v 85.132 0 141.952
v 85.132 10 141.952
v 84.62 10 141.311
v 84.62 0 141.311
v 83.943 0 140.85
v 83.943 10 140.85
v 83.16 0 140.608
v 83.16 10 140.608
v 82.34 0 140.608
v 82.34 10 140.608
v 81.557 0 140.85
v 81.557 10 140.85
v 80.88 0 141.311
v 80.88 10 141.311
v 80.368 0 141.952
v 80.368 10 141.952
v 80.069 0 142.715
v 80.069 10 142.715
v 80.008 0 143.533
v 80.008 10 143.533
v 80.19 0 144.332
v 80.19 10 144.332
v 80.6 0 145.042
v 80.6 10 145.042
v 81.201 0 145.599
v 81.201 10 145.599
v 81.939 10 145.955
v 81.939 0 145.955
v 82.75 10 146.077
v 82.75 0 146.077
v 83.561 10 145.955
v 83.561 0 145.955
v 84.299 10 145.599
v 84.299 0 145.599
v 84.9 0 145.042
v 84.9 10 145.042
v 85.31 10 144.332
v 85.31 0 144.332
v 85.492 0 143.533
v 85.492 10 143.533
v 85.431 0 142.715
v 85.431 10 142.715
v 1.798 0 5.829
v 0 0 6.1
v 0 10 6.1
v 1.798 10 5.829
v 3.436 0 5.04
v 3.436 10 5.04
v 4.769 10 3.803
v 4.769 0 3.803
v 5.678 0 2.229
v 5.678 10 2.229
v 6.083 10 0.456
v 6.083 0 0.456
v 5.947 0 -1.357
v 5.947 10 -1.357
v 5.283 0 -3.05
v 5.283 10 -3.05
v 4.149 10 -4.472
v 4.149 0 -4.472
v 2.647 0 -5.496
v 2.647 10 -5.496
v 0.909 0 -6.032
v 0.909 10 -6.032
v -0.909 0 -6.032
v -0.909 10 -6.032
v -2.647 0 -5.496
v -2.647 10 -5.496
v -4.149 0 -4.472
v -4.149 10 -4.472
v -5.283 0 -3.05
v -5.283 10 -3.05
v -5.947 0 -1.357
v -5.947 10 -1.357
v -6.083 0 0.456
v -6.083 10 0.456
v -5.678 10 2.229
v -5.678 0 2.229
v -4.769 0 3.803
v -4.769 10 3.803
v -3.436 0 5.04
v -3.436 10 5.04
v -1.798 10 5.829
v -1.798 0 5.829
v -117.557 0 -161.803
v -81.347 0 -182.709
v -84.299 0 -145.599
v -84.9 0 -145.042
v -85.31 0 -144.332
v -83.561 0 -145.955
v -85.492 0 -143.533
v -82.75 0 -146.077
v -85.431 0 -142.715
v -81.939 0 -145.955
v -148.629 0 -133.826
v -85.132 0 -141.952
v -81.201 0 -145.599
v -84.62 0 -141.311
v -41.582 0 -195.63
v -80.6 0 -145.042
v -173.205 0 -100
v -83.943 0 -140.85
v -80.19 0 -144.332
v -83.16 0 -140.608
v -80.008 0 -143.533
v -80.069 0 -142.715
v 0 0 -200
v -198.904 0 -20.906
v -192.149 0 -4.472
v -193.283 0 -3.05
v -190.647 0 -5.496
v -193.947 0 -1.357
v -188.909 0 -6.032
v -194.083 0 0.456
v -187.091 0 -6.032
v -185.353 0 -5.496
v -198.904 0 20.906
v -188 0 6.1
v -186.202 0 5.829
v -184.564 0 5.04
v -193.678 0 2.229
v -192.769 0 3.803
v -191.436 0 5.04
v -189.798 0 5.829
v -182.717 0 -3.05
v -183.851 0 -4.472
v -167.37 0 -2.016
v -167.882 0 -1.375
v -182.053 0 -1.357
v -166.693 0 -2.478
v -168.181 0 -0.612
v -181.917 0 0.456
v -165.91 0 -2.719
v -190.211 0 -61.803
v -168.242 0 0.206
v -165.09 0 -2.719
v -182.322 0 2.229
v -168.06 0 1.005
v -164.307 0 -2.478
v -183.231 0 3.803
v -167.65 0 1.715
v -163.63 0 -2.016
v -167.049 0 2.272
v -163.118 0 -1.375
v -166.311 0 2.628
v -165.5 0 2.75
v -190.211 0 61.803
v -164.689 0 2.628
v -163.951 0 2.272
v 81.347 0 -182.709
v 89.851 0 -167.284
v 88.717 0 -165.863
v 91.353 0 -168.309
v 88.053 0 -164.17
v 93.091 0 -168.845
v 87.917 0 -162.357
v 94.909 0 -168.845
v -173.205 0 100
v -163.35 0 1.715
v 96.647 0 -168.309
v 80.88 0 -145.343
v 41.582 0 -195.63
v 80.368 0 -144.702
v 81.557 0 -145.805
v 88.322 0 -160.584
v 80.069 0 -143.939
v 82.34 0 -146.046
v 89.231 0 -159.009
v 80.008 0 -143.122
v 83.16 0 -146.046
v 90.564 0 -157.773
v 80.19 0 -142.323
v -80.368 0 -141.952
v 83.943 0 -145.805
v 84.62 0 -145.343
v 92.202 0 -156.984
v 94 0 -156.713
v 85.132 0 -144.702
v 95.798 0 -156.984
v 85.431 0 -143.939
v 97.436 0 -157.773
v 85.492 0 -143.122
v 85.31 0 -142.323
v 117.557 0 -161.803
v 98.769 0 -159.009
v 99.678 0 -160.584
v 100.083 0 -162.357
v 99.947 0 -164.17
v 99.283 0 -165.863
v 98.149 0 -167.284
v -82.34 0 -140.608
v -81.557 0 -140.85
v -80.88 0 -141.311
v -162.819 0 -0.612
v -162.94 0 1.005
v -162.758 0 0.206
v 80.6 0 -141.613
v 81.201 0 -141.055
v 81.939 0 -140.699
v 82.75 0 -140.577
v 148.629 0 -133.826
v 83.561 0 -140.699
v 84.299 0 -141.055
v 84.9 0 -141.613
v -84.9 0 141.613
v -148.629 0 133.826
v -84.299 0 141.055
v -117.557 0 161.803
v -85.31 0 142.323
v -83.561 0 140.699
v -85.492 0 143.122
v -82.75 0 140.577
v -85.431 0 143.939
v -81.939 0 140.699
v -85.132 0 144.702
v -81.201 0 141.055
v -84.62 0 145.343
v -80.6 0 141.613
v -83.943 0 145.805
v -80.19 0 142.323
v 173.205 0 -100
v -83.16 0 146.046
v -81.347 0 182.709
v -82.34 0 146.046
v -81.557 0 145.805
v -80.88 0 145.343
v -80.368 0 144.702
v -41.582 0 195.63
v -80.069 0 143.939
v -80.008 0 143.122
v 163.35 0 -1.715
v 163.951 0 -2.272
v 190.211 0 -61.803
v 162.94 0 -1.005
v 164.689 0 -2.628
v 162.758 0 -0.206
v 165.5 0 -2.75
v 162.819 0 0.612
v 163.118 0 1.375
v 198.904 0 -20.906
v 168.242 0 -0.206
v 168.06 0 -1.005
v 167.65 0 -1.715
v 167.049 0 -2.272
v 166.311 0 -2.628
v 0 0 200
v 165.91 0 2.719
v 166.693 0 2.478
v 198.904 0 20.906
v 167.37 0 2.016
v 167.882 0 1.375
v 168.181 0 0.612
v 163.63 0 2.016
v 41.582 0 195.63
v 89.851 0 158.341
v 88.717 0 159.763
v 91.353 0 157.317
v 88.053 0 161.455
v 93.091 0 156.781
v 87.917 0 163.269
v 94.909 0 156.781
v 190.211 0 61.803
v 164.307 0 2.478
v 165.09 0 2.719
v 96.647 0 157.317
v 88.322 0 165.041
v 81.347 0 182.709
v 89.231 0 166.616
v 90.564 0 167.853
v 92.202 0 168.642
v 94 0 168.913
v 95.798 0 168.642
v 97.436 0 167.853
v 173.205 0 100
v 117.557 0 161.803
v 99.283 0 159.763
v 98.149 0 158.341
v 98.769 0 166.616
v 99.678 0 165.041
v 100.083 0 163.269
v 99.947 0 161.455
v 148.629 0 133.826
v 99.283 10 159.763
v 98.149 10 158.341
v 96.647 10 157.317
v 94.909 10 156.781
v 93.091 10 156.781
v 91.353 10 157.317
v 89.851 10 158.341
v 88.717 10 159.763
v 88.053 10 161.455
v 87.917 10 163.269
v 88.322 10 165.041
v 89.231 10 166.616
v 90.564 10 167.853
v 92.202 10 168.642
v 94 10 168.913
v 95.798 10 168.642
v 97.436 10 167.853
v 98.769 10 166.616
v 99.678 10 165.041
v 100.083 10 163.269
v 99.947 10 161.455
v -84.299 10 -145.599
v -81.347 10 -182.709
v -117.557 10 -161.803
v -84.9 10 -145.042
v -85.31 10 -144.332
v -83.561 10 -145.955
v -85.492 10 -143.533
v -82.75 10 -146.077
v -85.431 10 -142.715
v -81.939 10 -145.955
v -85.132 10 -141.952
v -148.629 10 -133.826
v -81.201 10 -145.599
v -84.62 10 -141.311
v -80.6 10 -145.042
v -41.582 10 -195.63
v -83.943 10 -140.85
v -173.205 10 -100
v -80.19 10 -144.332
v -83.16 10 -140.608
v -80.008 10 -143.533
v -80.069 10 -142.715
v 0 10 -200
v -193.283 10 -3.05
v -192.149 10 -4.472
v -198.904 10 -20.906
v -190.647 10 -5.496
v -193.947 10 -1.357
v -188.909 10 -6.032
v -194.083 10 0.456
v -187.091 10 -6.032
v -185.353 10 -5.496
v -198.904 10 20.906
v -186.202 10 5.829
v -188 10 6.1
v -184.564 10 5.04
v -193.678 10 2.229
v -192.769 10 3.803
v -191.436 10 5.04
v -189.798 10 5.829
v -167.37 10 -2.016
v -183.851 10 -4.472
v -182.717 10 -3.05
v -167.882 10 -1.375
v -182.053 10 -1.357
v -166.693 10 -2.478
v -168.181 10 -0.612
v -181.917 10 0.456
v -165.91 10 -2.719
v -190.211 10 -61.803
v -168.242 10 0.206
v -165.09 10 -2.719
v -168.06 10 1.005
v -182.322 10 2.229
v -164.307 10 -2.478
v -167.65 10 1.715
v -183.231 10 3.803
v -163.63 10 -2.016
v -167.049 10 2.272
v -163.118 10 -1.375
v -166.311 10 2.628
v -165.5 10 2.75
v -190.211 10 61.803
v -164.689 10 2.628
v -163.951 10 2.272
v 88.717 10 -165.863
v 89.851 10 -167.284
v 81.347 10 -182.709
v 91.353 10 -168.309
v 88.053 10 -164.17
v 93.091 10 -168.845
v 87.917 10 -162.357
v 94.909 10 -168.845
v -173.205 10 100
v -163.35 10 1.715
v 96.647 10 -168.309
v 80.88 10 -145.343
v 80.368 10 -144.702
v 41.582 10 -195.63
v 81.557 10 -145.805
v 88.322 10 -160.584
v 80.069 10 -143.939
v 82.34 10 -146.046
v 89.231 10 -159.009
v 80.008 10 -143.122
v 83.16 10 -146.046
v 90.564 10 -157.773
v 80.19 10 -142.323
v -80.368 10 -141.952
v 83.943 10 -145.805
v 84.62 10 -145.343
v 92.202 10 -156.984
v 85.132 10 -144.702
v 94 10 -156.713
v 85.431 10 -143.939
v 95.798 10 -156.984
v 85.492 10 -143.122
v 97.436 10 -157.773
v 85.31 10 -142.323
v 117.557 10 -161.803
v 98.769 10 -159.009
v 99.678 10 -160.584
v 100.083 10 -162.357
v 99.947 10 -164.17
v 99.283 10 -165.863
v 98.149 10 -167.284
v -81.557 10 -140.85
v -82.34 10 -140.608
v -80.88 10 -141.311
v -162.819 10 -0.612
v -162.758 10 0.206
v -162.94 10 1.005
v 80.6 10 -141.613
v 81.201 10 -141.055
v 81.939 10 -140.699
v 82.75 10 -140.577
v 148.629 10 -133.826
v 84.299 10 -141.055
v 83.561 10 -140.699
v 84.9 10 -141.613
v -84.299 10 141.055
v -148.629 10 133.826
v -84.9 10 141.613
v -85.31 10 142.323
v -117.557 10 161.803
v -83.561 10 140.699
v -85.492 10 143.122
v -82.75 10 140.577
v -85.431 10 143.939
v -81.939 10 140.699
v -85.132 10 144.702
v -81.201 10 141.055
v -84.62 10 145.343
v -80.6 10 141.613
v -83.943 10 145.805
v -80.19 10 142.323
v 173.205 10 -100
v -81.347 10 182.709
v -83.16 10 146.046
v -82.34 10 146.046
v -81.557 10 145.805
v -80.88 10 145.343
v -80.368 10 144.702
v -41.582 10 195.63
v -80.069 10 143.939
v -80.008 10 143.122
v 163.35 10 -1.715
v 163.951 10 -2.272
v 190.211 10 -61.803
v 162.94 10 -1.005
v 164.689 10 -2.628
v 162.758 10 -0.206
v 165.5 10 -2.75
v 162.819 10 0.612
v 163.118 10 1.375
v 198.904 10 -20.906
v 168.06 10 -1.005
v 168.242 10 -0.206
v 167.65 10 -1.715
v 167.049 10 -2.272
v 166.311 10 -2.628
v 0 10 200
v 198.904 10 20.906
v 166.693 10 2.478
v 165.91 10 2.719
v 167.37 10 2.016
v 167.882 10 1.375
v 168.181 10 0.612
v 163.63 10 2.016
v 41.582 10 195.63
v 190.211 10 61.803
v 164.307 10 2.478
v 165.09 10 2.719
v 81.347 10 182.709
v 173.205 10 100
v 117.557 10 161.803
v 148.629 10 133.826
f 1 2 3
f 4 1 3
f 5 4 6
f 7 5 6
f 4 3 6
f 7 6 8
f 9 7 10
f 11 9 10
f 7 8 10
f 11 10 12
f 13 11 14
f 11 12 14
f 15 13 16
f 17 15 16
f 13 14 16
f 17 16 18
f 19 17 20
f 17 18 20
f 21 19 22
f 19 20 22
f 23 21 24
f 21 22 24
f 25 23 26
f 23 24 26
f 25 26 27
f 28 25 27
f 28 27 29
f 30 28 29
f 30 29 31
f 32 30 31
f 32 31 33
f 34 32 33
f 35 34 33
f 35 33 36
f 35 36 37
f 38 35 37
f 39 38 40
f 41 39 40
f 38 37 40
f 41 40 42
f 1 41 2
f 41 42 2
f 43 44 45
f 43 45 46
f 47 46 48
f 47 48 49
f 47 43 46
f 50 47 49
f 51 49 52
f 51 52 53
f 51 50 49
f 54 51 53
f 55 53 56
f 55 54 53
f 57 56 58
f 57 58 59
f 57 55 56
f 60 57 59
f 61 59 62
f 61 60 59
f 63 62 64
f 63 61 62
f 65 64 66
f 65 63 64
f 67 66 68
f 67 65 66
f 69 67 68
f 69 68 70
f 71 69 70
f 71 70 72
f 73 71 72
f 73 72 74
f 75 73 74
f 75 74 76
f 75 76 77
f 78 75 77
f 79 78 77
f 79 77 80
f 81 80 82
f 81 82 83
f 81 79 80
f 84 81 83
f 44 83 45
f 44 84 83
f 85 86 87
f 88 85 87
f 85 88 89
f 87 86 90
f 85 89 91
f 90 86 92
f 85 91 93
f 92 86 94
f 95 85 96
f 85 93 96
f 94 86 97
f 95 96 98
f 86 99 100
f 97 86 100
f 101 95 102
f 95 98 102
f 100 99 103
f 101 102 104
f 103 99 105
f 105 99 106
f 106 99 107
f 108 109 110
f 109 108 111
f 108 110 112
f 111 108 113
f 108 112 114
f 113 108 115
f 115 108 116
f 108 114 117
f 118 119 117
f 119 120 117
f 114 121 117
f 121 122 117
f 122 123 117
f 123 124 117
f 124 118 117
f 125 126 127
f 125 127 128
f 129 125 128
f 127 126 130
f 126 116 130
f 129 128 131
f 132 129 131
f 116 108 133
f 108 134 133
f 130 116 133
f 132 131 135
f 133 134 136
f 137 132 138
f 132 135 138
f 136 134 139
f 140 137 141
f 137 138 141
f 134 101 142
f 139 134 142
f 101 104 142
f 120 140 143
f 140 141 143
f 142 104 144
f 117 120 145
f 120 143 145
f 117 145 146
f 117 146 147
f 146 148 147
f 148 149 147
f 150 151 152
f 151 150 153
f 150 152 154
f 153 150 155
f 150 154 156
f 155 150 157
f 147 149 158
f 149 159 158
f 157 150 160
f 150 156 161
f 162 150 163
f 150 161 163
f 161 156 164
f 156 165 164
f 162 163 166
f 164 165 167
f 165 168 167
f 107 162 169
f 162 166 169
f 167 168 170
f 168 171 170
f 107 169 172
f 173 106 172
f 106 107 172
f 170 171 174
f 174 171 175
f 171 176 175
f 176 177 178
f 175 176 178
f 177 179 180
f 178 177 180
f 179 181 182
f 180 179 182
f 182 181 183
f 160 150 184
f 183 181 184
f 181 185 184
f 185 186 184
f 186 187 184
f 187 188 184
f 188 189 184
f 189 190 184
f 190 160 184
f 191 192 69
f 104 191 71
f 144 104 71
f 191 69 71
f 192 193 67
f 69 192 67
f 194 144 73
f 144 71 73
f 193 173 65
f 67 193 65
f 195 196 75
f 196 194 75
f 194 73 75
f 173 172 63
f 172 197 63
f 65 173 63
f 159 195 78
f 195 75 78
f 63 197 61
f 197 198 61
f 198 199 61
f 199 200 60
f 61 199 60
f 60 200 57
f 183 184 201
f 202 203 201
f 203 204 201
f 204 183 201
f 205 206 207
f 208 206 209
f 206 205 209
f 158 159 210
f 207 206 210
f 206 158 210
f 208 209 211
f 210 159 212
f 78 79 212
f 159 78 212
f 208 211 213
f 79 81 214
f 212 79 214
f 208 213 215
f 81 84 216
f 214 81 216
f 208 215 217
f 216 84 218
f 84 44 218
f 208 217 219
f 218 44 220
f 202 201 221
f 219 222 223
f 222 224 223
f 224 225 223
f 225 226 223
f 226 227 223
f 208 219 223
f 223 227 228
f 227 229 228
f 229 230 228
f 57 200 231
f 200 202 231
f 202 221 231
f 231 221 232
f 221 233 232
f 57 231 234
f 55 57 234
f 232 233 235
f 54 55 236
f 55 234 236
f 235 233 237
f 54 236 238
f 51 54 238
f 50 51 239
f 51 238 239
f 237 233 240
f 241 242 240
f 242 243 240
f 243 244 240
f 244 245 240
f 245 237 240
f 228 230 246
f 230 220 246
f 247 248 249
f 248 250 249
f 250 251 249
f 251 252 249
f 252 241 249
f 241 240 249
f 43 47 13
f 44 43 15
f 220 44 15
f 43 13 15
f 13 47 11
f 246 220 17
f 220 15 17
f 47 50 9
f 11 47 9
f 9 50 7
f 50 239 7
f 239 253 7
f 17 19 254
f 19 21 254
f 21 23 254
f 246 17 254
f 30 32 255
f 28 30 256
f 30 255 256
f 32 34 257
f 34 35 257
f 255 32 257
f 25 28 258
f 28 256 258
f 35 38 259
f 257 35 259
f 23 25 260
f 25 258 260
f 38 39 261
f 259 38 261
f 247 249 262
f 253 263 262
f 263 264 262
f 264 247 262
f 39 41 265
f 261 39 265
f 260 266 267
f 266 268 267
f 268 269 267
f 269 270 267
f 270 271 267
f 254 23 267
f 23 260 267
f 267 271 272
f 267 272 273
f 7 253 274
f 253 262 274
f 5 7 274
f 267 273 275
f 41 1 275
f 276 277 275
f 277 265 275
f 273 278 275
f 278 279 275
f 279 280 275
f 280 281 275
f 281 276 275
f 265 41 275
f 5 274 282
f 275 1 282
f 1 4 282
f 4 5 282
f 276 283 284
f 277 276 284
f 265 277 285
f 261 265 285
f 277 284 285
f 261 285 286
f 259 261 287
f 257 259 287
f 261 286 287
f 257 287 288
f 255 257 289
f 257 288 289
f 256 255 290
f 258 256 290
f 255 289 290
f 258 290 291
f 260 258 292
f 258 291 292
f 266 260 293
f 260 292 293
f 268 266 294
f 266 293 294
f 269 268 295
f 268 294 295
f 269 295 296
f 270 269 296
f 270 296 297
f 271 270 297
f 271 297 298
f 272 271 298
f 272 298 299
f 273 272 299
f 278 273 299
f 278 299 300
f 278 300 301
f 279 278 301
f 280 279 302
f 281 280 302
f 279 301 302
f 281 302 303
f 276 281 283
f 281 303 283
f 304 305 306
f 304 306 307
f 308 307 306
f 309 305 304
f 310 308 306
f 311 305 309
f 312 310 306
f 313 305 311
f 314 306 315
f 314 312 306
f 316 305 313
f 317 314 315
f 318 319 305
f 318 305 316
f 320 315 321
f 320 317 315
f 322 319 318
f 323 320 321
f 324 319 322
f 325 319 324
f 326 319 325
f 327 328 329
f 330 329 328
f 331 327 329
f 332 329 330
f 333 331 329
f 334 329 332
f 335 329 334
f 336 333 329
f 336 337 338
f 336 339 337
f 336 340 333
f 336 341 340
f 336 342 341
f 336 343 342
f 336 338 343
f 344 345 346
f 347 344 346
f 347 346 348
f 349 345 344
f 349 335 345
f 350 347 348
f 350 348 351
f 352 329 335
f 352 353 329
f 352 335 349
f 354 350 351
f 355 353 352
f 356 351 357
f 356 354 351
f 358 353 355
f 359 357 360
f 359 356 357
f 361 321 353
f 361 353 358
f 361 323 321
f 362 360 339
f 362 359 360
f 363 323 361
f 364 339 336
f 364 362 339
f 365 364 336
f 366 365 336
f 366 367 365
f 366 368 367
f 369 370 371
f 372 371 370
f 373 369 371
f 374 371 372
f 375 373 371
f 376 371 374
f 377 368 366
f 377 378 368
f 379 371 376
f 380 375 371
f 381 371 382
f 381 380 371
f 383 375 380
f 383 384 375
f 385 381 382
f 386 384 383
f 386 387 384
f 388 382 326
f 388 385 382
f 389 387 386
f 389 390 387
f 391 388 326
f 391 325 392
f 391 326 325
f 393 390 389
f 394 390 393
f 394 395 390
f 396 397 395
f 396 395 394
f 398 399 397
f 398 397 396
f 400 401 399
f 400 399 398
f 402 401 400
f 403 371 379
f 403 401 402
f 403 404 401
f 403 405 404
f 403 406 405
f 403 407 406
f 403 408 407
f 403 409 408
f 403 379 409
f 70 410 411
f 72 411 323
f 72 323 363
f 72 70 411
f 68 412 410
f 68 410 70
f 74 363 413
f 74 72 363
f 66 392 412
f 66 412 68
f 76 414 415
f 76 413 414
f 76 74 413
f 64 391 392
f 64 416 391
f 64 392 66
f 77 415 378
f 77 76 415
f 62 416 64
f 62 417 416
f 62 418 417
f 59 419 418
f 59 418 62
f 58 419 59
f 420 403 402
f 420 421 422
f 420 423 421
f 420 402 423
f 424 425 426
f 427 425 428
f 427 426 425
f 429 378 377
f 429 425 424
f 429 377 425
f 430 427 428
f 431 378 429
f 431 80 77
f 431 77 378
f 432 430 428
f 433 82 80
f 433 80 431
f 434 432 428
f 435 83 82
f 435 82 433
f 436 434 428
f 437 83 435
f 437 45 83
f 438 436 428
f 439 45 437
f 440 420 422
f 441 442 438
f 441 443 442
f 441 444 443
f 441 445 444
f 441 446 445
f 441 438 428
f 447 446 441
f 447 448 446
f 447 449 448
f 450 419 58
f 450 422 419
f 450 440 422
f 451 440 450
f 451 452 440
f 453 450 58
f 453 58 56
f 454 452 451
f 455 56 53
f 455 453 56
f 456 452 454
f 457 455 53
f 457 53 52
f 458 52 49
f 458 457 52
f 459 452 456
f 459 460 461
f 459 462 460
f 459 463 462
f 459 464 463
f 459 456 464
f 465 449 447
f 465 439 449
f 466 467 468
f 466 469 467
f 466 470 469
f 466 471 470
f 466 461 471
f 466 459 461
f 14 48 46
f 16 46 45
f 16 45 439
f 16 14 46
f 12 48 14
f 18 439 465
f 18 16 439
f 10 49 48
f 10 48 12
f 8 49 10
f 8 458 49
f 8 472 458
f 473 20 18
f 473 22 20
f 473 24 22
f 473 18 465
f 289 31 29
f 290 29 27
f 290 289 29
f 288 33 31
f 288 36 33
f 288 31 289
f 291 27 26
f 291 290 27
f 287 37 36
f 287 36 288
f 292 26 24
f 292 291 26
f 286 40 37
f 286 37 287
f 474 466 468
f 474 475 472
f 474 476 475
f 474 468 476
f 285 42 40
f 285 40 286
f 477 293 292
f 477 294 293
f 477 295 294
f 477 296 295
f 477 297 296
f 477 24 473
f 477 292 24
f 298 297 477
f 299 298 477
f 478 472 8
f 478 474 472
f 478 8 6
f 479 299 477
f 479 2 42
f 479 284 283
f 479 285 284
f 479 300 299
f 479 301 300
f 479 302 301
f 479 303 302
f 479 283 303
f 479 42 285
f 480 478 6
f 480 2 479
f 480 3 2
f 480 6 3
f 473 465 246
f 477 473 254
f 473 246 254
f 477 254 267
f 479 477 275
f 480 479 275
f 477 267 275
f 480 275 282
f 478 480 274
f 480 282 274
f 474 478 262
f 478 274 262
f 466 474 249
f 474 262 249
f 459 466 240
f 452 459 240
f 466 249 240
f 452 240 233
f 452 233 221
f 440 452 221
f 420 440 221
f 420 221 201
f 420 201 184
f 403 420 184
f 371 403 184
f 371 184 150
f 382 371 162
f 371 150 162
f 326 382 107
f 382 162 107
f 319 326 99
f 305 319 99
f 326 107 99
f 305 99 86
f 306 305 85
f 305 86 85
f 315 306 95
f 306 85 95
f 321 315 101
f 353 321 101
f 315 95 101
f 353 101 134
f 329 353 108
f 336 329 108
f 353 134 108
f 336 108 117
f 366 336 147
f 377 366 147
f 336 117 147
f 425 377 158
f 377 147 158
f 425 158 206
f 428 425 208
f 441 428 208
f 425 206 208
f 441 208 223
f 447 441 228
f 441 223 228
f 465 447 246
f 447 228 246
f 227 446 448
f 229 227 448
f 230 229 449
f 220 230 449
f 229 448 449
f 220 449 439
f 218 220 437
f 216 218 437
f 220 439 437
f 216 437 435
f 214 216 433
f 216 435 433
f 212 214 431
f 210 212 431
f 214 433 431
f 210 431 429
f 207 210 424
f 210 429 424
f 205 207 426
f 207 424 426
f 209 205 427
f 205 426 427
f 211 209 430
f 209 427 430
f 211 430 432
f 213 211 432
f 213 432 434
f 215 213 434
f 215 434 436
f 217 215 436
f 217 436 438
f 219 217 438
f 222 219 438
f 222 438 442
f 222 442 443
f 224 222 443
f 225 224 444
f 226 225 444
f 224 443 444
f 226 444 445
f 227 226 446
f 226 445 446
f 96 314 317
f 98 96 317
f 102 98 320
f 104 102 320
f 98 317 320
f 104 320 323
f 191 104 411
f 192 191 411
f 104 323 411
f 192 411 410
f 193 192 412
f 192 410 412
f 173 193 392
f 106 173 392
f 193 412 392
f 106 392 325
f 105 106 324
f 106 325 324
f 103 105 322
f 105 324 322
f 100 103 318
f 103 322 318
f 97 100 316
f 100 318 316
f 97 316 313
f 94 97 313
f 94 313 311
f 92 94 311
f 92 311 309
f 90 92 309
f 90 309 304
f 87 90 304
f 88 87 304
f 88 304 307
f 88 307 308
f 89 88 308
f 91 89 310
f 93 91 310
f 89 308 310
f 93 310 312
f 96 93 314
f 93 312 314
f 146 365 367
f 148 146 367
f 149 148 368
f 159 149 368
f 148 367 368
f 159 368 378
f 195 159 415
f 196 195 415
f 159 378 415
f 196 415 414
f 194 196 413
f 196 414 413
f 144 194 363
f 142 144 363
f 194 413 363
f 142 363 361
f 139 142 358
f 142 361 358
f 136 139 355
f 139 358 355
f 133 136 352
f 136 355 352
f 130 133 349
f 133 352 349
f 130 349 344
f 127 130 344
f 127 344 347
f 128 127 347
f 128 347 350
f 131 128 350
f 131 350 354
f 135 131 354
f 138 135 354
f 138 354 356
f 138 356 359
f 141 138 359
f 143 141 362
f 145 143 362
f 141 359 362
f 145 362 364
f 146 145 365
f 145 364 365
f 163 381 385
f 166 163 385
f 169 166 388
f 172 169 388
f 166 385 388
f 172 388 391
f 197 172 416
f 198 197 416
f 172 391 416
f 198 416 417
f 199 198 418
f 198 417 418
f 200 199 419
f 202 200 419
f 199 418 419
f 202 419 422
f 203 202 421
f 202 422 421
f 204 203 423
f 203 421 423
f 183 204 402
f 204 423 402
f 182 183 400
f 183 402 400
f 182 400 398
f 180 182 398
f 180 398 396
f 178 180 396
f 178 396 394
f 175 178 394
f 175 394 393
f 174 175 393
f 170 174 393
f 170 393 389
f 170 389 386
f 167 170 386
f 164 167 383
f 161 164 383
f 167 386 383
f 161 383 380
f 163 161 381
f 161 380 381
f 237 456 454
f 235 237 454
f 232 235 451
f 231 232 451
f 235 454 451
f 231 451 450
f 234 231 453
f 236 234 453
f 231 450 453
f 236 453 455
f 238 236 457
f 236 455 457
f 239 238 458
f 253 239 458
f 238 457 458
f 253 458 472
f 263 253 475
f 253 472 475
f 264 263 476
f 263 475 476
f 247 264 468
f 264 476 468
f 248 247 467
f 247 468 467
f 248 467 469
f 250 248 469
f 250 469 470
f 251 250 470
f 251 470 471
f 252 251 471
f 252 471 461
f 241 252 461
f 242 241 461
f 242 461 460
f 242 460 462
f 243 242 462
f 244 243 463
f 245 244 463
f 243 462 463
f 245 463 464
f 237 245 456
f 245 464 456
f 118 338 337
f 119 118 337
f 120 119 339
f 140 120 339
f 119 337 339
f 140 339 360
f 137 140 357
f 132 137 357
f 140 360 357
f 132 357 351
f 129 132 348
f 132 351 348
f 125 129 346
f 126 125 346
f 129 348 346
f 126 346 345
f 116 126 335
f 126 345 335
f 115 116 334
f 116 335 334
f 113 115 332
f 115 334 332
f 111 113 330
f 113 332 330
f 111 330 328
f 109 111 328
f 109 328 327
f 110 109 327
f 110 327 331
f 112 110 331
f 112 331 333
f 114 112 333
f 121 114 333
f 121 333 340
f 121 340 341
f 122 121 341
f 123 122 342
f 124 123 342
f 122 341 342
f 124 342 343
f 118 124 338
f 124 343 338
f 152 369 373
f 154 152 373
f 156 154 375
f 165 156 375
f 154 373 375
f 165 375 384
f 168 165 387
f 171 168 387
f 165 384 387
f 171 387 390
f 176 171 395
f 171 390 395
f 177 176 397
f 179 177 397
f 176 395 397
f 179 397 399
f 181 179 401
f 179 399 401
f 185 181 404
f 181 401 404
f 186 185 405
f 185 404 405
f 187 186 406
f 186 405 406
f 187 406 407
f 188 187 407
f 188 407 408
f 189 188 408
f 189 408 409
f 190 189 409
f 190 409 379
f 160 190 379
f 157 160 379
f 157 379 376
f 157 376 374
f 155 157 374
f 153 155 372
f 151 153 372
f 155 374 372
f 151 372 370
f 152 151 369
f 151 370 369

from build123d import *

# Parameters (mm, degrees)
SKETCH_1_R               = 200
SKETCH_1_R_2             = 6.1
EXTRUDE_1_DEPTH          = 10
SKETCH_2_R               = 6.1
CUT_EXTRUDE_1_DEPTH      = 10
PATTERN_CIRCULAR_1_COUNT = 3
SKETCH_3_R               = 2.75
CUT_EXTRUDE_2_DEPTH      = 10
PATTERN_CIRCULAR_2_COUNT = 6


with BuildPart() as part:
    # Эскиз1 → Бобышка-Вытянуть1 (new body)
    with BuildSketch(Plane(origin=(0, 0, 0), x_dir=(1, 0, 0), z_dir=(0, 1, 0))):
        with Locations(Location((0, 0, 0), (0, 0, 270))):
            Circle(SKETCH_1_R)
        with Locations(Location((0, 0, 0), (0, 0, 270))):
            Circle(SKETCH_1_R_2, mode=Mode.SUBTRACT)
    extrude(amount=EXTRUDE_1_DEPTH)

    # Эскиз2 → Вырез-Вытянуть1 (cut)
    with BuildSketch(Plane(origin=(0, 10, 0), x_dir=(1, 0, 0), z_dir=(0, 1, 0))):
        with Locations(Location((-188, 0, 0), (0, 0, 270))):
            Circle(SKETCH_2_R)
    cut_extrude_1 = extrude(amount=-CUT_EXTRUDE_1_DEPTH, mode=Mode.SUBTRACT)

    # Круговой массив1: Вырез-Вытянуть1 ×3 about axis
    pattern_circular_1_axis = Axis((0, 0, 0), (0, 1, 0))
    for i in range(1, PATTERN_CIRCULAR_1_COUNT):
        add(cut_extrude_1.rotate(pattern_circular_1_axis, i * 360 / PATTERN_CIRCULAR_1_COUNT), mode=Mode.SUBTRACT)

    # Эскиз3 → Вырез-Вытянуть2 (cut)
    with BuildSketch(Plane(origin=(0, 10, 0), x_dir=(1, 0, 0), z_dir=(0, 1, 0))):
        with Locations(Location((-165.5, 0, 0), (0, 0, 270))):
            Circle(SKETCH_3_R)
    cut_extrude_2 = extrude(amount=-CUT_EXTRUDE_2_DEPTH, mode=Mode.SUBTRACT)

    # Круговой массив2: Вырез-Вытянуть2 ×6 about axis
    pattern_circular_2_axis = Axis((0, 0, 0), (0, 1, 0))
    for i in range(1, PATTERN_CIRCULAR_2_COUNT):
        add(cut_extrude_2.rotate(pattern_circular_2_axis, i * 360 / PATTERN_CIRCULAR_2_COUNT), mode=Mode.SUBTRACT)


solid = part.part
